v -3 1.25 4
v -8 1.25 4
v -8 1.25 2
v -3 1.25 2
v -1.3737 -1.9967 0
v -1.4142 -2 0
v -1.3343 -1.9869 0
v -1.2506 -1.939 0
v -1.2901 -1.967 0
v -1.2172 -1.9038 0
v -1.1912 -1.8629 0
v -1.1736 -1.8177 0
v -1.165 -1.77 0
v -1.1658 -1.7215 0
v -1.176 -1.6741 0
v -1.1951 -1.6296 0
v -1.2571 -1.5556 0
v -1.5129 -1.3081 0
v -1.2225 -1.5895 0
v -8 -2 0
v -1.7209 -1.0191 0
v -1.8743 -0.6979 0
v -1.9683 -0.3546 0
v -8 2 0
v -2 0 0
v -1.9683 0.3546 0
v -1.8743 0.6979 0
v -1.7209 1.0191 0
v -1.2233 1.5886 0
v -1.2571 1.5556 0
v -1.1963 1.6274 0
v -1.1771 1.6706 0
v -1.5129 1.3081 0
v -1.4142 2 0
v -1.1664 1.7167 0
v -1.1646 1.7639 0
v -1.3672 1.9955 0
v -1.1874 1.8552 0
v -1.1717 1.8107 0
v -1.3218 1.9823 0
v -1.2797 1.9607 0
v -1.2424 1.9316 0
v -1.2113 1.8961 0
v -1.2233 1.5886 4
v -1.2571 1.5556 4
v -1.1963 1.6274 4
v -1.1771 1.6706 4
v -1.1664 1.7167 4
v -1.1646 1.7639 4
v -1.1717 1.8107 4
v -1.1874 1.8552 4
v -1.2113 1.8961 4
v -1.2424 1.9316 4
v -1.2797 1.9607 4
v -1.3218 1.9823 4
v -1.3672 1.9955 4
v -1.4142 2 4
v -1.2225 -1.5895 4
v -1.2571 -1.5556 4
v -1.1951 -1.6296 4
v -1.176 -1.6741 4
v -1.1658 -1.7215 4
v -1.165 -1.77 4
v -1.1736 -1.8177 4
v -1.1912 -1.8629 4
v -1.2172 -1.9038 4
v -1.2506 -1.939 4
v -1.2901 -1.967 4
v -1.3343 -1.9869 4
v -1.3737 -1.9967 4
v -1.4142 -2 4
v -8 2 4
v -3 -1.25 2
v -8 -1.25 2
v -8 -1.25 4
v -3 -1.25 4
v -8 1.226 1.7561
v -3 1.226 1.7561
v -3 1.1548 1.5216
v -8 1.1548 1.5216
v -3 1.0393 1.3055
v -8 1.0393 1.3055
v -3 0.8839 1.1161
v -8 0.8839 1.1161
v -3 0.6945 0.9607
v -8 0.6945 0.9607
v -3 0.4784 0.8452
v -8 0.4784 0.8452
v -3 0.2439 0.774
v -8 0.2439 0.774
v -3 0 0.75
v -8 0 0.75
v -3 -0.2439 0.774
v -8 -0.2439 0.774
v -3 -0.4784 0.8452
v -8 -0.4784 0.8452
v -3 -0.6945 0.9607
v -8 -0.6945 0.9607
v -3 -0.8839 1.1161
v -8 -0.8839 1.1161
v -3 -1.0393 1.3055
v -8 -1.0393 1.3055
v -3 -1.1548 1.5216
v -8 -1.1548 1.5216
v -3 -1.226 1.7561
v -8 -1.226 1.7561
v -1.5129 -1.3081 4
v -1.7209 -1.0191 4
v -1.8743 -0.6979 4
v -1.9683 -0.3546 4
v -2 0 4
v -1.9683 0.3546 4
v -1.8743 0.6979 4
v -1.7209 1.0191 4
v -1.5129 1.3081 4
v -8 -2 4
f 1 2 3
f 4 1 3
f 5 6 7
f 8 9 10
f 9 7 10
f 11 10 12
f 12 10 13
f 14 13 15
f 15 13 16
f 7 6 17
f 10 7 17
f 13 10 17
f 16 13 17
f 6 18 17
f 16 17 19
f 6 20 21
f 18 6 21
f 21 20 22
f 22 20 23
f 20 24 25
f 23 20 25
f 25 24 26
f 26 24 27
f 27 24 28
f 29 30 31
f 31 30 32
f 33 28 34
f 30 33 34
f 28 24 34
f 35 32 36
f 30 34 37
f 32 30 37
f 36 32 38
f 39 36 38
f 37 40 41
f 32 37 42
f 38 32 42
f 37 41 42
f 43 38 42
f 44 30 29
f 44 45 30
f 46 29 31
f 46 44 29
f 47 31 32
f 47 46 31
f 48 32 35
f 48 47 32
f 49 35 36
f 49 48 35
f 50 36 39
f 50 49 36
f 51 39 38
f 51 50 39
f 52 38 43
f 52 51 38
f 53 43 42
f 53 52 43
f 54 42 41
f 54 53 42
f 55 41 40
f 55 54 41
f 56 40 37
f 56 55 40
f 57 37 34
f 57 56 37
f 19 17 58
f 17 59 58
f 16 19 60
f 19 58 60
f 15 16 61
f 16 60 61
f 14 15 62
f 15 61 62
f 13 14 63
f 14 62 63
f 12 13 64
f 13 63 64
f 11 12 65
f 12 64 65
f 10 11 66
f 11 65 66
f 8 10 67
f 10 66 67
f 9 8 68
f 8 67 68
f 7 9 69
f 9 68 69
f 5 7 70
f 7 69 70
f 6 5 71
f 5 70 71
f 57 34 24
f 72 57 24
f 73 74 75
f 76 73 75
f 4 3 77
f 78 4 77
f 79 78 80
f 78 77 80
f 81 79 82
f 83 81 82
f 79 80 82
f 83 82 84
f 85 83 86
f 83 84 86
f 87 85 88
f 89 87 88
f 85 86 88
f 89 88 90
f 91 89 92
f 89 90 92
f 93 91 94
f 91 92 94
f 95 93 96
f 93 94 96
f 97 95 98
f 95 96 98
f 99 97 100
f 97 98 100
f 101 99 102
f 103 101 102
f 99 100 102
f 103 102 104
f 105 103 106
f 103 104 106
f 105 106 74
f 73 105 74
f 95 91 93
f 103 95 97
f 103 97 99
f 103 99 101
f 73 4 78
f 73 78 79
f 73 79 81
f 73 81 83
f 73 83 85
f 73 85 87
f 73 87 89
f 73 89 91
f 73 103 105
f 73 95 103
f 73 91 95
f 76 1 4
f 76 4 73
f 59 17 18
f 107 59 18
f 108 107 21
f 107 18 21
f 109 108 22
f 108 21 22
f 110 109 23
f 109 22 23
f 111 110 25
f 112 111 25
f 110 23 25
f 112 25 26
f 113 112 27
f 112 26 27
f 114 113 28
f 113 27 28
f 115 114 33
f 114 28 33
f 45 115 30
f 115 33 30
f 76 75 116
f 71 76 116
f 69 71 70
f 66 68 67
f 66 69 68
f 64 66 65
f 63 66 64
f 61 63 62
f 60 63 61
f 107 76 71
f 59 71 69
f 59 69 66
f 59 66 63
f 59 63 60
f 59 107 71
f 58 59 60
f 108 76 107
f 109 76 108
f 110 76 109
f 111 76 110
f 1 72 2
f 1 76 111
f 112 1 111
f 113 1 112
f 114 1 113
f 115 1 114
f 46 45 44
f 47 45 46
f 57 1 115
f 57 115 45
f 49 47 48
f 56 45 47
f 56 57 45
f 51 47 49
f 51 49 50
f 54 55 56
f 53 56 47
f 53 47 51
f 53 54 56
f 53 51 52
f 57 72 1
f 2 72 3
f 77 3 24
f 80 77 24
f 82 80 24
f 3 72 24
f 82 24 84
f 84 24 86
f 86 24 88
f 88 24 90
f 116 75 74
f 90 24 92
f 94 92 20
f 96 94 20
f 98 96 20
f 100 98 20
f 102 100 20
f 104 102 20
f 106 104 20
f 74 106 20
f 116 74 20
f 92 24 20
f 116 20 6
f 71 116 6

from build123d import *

# Parameters (mm, degrees)
F1_DEPTH = 4
F3_DEPTH = 5
F4_R     = 0.25


with BuildPart() as f1:
    # F0 (on Top) → F1 (new body)
    with BuildSketch(Plane.XY):
        with BuildLine():
            ThreePointArc((0, -2), (-2, 0), (0, 2))
            Line((0, 2), (-8, 2))
            Line((-8, 2), (-8, -2))
            Line((-8, -2), (0, -2))
        make_face()
    extrude(amount=F1_DEPTH)

    # F2 (on face) → F3 (cut)
    with BuildSketch(Plane(origin=(-8, 0, 0), x_dir=(0, -1, 0), z_dir=(-1, 0, 0))):
        with BuildLine():
            ThreePointArc((-1.25, 2), (0, 0.75), (1.25, 2))
            ThreePointArc((1.25, 2), (0, 3.25), (-1.25, 2))
        make_face()
        with BuildLine():
            ThreePointArc((-1.25, 2), (0, 3.25), (1.25, 2))
            Line((1.25, 2), (1.25, 4))
            Line((1.25, 4), (-1.25, 4))
            Line((-1.25, 4), (-1.25, 2))
        make_face()
    extrude(amount=-F3_DEPTH, mode=Mode.SUBTRACT)

    # F4
    f4_edges = [f1.edges().sort_by_distance(p)[0] for p in [
        (0, 2, 2),
        (0, -2, 2),
    ]]
    fillet(f4_edges, radius=F4_R)


solid = f1.part
